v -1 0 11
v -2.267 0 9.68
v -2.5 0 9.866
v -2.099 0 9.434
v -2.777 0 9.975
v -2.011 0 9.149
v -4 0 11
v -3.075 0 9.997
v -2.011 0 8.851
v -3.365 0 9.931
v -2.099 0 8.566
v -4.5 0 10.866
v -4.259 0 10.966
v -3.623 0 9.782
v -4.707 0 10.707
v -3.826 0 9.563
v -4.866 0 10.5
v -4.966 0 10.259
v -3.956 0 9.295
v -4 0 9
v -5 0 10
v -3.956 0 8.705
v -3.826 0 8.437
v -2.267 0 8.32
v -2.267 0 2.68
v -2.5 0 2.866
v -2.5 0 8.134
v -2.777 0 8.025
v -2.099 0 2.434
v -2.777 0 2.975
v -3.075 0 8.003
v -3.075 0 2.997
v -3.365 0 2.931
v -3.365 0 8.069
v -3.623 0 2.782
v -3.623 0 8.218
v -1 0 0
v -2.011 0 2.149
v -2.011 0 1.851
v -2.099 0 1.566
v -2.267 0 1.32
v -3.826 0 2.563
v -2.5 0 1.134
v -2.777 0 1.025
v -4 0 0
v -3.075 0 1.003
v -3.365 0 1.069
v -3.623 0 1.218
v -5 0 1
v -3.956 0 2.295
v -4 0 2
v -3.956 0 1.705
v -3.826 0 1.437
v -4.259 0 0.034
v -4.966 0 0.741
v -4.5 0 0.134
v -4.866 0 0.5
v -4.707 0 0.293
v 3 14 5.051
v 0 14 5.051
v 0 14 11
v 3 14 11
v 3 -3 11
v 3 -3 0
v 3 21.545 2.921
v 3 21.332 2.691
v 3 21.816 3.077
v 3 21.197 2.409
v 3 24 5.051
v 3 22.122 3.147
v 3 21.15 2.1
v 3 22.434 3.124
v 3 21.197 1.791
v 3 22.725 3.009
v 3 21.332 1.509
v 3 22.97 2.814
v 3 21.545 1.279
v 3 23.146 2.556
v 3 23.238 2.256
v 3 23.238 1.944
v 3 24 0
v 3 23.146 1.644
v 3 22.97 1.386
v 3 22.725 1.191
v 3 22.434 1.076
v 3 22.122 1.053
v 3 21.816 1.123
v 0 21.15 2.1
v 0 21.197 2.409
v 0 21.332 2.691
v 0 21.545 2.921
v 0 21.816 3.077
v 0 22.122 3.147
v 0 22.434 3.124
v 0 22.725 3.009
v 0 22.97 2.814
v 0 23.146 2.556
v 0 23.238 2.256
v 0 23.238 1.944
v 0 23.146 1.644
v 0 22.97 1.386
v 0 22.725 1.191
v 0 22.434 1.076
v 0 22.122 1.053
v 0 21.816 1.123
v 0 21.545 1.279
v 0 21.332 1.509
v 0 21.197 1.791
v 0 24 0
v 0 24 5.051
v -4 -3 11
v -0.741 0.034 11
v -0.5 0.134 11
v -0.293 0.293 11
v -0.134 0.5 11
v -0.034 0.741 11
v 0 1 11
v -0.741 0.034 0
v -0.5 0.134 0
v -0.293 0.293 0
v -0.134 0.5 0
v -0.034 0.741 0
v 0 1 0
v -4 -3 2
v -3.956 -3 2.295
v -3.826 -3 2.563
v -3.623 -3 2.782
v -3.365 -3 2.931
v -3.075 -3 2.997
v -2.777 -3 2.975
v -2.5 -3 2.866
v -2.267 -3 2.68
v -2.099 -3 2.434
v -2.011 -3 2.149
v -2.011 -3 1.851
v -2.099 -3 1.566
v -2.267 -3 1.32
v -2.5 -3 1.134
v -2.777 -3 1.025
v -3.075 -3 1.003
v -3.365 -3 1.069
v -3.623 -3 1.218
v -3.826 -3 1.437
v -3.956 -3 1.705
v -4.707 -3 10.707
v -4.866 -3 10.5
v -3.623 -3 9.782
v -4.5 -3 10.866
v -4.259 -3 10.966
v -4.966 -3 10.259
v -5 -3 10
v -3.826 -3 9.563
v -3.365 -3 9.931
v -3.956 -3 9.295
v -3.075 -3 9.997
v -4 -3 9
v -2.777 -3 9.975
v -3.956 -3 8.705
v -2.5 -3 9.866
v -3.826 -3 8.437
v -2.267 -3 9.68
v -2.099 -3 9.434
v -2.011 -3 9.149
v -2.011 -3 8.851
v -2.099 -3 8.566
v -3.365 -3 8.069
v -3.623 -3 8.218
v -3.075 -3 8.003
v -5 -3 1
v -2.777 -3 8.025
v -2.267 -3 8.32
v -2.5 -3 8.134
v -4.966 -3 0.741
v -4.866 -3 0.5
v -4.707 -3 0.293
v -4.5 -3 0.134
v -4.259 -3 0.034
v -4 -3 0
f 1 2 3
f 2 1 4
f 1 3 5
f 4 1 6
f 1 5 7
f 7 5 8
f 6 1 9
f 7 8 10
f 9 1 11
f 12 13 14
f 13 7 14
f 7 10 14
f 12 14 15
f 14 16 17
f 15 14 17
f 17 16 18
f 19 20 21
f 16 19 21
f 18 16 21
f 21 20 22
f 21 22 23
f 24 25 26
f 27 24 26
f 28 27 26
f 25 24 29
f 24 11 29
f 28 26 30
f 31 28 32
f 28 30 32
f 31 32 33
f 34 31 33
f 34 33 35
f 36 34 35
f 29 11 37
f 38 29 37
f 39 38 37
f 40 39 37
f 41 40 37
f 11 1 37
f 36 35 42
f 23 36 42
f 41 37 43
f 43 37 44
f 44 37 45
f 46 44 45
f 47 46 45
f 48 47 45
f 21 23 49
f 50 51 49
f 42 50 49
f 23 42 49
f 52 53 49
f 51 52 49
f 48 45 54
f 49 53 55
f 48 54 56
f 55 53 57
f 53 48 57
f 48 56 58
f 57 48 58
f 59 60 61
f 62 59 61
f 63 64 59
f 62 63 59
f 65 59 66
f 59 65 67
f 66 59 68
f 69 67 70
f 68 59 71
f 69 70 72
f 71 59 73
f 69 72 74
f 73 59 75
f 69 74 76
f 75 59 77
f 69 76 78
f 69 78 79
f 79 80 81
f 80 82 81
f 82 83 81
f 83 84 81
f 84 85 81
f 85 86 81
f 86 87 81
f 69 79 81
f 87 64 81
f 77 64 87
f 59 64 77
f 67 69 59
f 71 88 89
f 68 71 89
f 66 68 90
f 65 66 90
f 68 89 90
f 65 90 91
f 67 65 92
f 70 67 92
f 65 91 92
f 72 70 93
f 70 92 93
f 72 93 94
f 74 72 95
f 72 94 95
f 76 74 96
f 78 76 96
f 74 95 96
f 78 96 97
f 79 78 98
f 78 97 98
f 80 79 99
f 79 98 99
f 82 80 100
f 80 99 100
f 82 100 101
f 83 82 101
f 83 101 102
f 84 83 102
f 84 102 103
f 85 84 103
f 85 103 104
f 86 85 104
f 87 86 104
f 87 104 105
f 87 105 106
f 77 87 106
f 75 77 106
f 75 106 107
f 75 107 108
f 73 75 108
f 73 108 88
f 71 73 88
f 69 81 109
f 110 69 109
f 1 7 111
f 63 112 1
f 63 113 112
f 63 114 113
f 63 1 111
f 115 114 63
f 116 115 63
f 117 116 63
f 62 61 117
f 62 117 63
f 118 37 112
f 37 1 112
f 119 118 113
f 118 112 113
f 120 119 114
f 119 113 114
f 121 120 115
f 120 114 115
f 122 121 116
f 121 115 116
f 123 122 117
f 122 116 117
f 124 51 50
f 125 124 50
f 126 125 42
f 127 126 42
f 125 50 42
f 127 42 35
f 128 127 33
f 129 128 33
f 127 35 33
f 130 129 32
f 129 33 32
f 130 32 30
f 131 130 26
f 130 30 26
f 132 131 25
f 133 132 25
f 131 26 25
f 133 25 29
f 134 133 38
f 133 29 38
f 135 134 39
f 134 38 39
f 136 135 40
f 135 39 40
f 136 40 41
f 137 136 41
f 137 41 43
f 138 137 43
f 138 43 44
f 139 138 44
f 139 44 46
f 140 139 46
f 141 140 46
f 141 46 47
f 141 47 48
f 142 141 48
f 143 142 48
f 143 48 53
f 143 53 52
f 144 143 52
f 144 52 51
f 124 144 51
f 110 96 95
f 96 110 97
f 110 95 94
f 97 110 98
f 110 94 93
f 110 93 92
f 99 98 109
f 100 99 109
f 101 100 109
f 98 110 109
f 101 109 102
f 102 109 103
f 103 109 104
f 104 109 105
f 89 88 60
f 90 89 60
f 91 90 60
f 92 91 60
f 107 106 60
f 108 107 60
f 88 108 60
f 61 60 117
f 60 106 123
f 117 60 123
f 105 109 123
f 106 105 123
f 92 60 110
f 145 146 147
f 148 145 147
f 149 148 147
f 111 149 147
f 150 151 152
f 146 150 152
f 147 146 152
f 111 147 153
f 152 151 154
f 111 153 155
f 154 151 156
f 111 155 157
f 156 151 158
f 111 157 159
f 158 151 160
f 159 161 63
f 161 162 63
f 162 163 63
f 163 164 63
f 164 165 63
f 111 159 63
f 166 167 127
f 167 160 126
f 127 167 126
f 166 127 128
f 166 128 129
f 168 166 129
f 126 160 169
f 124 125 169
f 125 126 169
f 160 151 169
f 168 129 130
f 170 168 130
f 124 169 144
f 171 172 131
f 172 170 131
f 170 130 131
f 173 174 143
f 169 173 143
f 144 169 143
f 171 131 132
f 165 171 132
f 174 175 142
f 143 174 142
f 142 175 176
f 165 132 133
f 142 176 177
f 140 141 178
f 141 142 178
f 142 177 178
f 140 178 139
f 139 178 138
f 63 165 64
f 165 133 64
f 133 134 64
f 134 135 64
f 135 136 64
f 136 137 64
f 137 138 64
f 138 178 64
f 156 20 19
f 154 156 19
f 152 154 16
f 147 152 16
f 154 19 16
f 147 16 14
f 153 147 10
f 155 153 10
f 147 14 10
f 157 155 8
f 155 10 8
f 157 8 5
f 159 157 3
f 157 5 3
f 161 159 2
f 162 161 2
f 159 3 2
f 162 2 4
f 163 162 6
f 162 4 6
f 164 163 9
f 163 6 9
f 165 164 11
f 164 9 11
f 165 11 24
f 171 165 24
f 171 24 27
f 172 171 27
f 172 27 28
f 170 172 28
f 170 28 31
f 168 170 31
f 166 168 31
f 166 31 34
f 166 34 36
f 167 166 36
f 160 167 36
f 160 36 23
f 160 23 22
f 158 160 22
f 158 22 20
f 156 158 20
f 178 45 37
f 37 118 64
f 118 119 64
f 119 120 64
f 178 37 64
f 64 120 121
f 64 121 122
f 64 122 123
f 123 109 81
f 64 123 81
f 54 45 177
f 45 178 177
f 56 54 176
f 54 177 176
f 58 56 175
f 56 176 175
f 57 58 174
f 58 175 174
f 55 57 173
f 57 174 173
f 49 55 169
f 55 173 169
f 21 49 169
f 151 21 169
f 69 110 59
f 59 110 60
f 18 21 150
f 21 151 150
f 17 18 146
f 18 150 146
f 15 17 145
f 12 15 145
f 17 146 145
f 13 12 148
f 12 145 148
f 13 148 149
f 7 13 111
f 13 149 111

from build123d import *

# Parameters (mm, degrees)
PAD_DEPTH       = 11
POCKET_DEPTH    = 5
SKETCH003_R     = 1.05
POCKET001_DEPTH = 5
FILLET_R        = 1
FILLET001_R     = 1
FILLET002_R     = 1
SKETCH004_R     = 1
POCKET002_DEPTH = 5


with BuildPart() as part:
    # Sketch → Pad (new body)
    with BuildSketch(Plane.XY):
        Polygon((0, 0), (-5, 0), (-5, -3), (3, -3), (3, 24), (0, 24), align=None)
    extrude(amount=PAD_DEPTH)

    # Sketch002 (on Face6 of Pad) → Pocket (cut)
    with BuildSketch(Plane(origin=(0, 0, 0), x_dir=(0, -1, 0), z_dir=(-1, 0, 0))):
        Polygon((-24, 10.051275), (-24, 5.051275), (-14, 5.051275), (-14, 13.051275), (-24, 13.051275), align=None)
    extrude(amount=-POCKET_DEPTH, mode=Mode.SUBTRACT)

    # Sketch003 (on Face2 of Pocket) → Pocket001 (cut)
    with BuildSketch(Plane(origin=(0, 0, 0), x_dir=(0, -1, 0), z_dir=(-1, 0, 0))):
        with Locations((-22.2, 2.1)):
            Circle(SKETCH003_R)
    extrude(amount=-POCKET001_DEPTH, mode=Mode.SUBTRACT)

    # Fillet
    fillet_edges = [part.edges().sort_by_distance(p)[0] for p in [
        (0, 0, 5.5),
    ]]
    fillet(fillet_edges, radius=FILLET_R)

    # Fillet001
    fillet001_edges = [part.edges().sort_by_distance(p)[0] for p in [
        (-5, -1.5, 0),
    ]]
    fillet(fillet001_edges, radius=FILLET001_R)

    # Fillet002
    fillet002_edges = [part.edges().sort_by_distance(p)[0] for p in [
        (-5, -1.5, 11),
    ]]
    fillet(fillet002_edges, radius=FILLET002_R)

    # Sketch004 (on Face1 of Fillet002) → Pocket002 (cut)
    with BuildSketch(Plane(origin=(0, 0, 0), x_dir=(-1, 0, 0), z_dir=(0, 1, 0))):
        with Locations((3, 9)):
            Circle(SKETCH004_R)
        with Locations((3, 2)):
            Circle(SKETCH004_R)
    extrude(amount=-POCKET002_DEPTH, mode=Mode.SUBTRACT)


solid = part.part
